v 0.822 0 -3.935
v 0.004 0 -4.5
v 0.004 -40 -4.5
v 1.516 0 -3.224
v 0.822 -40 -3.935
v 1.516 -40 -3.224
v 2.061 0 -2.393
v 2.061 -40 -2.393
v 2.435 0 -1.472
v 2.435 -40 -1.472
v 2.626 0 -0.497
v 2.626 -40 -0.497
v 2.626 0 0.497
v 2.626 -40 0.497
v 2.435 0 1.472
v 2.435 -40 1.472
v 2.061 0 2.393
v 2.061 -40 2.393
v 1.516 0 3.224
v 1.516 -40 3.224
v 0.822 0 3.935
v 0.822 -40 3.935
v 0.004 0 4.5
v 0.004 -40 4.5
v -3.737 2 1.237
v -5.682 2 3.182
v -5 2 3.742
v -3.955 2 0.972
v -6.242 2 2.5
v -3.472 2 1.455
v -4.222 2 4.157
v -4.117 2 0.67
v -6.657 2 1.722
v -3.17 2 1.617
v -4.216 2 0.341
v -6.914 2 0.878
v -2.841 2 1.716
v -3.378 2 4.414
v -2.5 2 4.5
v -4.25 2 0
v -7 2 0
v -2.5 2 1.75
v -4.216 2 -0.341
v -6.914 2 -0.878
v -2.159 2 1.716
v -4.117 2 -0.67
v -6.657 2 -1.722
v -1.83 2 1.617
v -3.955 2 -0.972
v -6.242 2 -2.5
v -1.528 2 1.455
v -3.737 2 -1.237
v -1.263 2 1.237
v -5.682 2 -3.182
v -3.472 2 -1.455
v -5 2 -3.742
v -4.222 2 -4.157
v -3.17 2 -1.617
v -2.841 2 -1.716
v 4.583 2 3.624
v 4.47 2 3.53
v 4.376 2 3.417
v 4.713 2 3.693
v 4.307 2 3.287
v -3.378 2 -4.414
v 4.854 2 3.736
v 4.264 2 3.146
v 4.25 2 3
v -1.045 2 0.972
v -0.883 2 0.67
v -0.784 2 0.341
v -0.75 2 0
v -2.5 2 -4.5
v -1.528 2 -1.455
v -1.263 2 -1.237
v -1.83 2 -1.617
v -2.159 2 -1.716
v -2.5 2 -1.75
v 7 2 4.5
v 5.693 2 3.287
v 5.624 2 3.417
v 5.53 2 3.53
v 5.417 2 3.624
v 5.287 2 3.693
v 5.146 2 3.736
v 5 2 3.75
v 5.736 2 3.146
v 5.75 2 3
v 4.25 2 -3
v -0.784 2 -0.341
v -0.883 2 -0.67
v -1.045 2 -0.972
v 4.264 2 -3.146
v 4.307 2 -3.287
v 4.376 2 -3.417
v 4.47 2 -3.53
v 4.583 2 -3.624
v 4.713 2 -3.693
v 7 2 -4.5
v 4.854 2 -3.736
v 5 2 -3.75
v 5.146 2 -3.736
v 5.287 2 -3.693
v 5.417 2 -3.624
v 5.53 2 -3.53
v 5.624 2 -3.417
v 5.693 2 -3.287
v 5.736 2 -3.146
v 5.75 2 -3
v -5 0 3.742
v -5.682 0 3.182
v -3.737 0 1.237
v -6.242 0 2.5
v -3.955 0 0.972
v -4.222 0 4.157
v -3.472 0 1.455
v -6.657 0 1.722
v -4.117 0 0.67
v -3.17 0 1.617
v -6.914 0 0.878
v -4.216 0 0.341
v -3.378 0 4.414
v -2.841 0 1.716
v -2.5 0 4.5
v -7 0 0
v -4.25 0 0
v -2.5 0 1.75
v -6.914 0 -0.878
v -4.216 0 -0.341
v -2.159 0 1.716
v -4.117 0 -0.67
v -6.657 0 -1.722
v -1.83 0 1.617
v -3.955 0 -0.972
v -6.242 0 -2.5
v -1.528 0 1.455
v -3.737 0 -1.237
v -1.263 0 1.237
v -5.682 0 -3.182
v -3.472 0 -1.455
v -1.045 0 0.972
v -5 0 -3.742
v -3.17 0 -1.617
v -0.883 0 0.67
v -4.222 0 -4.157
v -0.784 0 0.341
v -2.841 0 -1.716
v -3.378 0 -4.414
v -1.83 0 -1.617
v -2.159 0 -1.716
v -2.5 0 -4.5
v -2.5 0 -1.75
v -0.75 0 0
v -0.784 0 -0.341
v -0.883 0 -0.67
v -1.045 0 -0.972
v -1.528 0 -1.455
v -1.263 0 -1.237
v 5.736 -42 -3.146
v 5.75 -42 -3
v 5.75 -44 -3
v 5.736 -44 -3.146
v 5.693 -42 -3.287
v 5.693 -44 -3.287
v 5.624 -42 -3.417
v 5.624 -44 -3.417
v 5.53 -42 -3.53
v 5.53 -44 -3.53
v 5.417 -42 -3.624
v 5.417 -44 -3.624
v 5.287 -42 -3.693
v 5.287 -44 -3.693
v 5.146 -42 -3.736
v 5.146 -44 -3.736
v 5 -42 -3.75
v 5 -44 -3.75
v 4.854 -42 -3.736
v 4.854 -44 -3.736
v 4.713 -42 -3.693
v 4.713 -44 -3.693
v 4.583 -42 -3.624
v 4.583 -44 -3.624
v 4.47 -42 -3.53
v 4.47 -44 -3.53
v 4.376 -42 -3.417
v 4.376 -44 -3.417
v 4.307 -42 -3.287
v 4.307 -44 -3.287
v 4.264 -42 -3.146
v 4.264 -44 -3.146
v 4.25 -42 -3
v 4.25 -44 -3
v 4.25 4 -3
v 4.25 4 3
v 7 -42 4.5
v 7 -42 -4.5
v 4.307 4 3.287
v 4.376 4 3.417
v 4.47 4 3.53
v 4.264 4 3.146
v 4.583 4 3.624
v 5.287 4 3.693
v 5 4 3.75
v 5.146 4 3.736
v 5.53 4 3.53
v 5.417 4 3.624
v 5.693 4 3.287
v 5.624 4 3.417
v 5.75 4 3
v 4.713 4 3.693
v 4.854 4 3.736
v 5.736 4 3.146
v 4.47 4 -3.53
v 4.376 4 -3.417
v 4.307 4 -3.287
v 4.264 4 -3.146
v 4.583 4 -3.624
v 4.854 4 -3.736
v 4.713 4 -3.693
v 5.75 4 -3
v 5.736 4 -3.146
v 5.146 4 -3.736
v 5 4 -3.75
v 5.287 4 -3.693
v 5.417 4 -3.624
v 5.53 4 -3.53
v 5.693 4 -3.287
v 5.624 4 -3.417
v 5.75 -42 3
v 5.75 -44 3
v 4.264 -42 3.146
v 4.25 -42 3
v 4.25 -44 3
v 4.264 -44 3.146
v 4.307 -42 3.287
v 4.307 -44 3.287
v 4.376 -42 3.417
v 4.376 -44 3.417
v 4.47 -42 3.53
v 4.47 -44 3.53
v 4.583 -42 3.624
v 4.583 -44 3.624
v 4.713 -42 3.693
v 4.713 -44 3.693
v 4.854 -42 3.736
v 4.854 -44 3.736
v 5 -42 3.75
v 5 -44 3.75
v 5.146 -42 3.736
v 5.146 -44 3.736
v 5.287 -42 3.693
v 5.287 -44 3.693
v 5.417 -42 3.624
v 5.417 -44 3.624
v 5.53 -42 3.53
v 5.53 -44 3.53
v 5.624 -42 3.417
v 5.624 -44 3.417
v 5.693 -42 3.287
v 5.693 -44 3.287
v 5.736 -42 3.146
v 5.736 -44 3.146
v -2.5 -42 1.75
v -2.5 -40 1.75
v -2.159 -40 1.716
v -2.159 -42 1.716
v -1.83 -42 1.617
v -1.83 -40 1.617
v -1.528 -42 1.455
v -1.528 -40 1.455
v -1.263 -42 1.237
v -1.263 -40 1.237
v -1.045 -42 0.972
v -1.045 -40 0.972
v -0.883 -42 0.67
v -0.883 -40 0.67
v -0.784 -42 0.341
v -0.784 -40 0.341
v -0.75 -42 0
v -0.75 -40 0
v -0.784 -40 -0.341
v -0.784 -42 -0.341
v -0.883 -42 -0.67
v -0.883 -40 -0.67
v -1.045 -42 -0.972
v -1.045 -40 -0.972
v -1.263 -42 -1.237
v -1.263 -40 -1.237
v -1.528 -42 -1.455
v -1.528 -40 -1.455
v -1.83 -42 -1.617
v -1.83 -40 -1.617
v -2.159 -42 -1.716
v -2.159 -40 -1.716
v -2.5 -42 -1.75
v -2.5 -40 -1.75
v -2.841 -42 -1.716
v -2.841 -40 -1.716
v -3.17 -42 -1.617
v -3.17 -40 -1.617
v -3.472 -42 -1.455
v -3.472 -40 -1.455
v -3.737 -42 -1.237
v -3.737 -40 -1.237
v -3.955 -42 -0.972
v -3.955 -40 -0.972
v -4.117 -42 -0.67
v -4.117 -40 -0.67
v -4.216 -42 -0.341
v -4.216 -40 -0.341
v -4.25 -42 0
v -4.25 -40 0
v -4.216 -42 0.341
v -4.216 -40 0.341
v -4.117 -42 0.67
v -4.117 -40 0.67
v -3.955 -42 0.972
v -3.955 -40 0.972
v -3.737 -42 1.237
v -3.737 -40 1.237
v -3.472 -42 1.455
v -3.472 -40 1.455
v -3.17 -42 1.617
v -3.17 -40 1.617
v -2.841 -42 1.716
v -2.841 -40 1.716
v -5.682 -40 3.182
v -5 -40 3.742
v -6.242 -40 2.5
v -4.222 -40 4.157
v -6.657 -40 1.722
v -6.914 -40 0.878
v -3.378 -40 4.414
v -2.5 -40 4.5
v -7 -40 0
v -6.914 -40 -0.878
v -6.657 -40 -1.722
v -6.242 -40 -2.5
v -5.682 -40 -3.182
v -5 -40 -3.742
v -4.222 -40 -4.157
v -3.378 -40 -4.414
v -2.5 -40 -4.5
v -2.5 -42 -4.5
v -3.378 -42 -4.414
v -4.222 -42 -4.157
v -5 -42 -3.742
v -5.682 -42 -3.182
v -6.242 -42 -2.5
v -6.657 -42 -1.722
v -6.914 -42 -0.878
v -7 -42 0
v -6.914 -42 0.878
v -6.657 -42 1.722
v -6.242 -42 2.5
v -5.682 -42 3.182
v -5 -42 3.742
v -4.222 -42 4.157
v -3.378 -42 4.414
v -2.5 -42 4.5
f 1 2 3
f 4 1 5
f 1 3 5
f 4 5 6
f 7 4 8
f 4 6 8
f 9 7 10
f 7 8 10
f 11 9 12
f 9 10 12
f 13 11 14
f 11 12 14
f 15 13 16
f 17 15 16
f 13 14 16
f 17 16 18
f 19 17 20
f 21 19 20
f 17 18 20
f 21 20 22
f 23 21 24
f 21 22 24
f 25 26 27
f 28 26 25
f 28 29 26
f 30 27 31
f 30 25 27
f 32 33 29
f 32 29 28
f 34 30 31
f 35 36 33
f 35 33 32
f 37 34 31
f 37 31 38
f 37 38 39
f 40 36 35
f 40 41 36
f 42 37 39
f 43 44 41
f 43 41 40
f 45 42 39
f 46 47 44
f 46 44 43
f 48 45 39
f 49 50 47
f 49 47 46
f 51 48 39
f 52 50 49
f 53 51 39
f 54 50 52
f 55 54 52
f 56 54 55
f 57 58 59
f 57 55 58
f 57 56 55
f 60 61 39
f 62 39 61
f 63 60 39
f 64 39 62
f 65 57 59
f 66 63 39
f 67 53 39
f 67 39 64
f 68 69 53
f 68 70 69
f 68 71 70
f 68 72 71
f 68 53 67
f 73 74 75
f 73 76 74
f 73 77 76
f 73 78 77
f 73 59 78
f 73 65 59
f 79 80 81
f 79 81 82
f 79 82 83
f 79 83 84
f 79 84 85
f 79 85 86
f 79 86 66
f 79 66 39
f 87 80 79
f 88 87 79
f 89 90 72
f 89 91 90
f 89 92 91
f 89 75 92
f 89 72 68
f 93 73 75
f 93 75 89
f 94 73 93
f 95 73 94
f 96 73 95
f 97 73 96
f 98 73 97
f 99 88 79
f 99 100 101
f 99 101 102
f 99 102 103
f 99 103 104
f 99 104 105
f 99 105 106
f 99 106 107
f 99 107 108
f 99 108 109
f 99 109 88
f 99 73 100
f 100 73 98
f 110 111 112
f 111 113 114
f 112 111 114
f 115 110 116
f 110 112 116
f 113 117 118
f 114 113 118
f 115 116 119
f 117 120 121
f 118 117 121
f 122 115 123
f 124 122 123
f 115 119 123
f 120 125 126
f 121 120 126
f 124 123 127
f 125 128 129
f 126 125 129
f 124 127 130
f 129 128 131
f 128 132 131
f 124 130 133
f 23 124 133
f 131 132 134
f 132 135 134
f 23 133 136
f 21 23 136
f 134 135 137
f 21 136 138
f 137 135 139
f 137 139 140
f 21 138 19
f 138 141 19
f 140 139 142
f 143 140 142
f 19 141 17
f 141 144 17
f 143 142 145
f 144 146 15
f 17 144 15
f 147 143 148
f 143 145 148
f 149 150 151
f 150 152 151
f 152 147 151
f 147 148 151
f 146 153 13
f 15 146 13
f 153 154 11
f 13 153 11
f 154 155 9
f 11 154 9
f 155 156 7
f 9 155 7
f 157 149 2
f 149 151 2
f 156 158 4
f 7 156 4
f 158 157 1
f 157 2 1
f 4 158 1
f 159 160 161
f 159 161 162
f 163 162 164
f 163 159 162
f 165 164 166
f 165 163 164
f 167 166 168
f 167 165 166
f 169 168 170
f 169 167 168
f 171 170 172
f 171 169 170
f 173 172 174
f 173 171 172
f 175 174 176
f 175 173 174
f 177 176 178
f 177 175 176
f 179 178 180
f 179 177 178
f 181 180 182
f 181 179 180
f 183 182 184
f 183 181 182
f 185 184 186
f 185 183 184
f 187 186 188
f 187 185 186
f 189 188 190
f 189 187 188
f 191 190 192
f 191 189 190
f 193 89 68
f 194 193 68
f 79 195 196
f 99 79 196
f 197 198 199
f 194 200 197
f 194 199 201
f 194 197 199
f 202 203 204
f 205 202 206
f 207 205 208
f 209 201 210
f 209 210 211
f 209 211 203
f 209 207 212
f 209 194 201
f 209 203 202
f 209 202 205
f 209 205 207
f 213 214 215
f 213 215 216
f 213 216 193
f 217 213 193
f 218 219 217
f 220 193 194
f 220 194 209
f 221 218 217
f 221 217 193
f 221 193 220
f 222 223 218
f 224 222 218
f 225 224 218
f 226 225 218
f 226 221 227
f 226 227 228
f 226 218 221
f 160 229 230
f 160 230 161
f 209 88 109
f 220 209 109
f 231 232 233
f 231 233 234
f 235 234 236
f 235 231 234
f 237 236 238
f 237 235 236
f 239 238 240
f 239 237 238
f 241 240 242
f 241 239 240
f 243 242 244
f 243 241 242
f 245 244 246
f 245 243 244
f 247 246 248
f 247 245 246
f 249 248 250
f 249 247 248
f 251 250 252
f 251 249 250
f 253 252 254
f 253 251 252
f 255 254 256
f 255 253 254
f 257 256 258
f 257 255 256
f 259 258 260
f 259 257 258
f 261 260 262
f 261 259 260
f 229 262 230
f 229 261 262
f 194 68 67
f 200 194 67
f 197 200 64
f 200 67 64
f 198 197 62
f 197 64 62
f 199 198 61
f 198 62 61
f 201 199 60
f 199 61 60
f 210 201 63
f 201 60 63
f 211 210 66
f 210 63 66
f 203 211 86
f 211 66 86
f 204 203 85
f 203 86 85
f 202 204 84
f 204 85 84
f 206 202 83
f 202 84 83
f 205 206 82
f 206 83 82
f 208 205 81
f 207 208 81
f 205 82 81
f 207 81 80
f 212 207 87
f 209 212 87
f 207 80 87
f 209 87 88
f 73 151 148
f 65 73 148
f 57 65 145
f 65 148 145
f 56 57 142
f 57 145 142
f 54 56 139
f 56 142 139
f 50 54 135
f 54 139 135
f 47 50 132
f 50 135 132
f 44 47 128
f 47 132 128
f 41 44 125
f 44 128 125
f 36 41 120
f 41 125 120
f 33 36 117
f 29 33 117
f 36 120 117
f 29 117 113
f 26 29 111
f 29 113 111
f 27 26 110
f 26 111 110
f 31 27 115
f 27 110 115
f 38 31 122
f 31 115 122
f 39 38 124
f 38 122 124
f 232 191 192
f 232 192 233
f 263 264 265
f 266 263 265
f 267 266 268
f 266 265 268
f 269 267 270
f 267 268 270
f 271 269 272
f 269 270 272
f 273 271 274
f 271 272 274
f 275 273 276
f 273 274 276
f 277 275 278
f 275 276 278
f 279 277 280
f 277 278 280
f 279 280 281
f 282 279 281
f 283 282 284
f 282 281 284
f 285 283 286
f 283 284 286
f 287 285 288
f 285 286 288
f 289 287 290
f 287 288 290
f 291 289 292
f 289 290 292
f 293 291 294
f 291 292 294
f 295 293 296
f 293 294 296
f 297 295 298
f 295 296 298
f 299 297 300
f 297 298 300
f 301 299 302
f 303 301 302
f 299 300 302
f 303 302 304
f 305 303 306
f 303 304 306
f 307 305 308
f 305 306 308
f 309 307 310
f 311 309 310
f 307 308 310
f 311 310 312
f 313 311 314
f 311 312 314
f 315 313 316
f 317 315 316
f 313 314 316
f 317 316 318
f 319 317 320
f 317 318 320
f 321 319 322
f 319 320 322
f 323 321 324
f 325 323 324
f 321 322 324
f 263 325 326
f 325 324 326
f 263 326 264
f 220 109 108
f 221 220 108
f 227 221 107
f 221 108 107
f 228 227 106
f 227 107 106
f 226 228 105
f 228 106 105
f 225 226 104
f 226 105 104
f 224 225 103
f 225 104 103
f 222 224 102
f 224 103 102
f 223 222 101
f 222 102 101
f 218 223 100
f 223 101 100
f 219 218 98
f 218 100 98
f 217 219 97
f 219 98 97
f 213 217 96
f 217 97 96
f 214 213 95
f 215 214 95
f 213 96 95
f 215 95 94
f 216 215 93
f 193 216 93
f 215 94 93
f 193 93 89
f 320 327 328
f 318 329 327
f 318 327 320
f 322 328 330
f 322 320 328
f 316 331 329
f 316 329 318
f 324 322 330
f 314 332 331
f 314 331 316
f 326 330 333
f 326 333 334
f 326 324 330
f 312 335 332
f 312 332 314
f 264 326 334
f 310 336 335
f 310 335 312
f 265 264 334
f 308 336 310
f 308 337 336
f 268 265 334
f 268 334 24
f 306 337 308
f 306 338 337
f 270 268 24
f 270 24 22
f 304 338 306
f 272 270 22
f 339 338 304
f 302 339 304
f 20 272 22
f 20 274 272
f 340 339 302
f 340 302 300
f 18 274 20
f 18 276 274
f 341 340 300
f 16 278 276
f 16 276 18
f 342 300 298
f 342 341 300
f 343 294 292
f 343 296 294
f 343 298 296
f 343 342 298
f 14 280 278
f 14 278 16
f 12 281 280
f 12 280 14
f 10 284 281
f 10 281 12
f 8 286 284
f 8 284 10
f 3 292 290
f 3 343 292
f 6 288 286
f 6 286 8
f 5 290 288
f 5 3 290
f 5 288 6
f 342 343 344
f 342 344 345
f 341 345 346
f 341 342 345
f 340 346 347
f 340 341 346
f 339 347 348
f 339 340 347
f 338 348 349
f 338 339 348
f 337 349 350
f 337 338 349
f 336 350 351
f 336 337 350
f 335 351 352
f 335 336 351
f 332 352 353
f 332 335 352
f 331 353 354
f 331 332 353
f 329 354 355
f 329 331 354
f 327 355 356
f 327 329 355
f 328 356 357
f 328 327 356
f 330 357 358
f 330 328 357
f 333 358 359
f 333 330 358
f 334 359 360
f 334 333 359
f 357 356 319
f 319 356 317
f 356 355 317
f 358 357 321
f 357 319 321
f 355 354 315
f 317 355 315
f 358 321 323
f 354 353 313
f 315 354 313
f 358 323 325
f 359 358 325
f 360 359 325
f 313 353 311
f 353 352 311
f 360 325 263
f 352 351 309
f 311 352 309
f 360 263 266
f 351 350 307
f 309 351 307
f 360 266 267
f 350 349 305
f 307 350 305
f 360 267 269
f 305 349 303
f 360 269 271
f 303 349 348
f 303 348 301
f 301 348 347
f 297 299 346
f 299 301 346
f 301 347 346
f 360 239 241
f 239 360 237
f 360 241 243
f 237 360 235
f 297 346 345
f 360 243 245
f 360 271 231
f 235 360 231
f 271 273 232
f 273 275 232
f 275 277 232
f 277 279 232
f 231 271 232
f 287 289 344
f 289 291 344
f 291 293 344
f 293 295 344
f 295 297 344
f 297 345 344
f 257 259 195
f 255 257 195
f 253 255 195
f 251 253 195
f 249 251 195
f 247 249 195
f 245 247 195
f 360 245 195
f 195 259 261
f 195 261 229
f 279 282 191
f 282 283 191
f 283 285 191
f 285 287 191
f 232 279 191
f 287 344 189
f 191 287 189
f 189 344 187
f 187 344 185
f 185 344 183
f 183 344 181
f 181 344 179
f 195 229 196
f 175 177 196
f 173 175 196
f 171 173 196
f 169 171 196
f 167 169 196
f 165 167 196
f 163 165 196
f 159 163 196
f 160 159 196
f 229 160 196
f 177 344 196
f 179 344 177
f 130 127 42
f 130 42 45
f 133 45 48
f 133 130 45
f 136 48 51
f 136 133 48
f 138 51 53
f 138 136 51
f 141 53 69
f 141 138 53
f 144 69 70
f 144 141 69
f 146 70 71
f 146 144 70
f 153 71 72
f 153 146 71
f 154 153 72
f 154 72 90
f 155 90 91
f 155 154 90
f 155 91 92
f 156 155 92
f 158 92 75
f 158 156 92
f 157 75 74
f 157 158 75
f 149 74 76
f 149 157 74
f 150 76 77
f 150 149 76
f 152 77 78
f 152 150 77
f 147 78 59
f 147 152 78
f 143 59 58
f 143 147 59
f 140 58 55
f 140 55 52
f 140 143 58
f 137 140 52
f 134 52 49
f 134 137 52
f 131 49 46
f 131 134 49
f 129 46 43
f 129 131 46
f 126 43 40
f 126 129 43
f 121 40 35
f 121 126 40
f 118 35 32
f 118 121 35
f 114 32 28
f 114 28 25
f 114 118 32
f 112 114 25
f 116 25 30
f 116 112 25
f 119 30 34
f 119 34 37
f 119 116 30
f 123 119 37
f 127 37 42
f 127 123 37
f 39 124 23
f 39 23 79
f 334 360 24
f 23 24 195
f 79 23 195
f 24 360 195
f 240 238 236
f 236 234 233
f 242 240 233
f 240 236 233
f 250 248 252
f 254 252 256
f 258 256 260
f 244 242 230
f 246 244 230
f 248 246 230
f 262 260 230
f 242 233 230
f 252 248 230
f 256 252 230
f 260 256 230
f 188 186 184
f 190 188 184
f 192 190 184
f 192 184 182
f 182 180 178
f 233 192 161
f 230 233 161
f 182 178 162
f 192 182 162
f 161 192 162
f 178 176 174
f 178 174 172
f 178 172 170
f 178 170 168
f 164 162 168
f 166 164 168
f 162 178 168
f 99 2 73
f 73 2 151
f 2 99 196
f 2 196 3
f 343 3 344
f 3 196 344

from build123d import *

# Parameters (mm, degrees)
SKETCH1_R           = 1.75
BOSS_EXTRUDE3_DEPTH = 2
BOSS_EXTRUDE4_DEPTH = 20
BOSS_EXTRUDE5_DEPTH = 4


with BuildPart() as part:
    # Sketch1 → Boss-Extrude3 (new body)
    with BuildSketch(Plane(origin=(0, 0, 0), x_dir=(1, 0, 0), z_dir=(0, 1, 0))):
        with BuildLine():
            ThreePointArc((-2.5, 4.5), (-7, 0), (-2.5, -4.5))
            Line((-2.5, -4.5), (7, -4.5))
            Line((7, -4.5), (7, 4.5))
            Line((7, 4.5), (-2.5, 4.5))
        make_face()
        with Locations((-2.5, 0)):
            Circle(SKETCH1_R, mode=Mode.SUBTRACT)
    extrude(amount=BOSS_EXTRUDE3_DEPTH)

    # Sketch1<3> → Boss-Extrude4 (add)
    # profile 1 of 2: a face of its own
    with BuildSketch(Plane(origin=(0, 0, 0), x_dir=(1, 0, 0), z_dir=(0, 1, 0))):
        with BuildLine():
            Line((2.508991915, 4.5), (0.004495957, 4.5))
            ThreePointArc((0.004495957, 4.5), (2.65, 0), (0.004495957, -4.5))
            Line((0.004495957, -4.5), (2.508991915, -4.5))
            Line((2.508991915, -4.5), (7, -4.5))
            Line((7, -4.5), (7, 4.5))
            Line((7, 4.5), (2.508991915, 4.5))
        make_face()
        with BuildLine():
            ThreePointArc((4.25, 3), (5, 3.75), (5.75, 3))
            Line((5.75, 3), (5.75, -3))
            ThreePointArc((5.75, -3), (5, -3.75), (4.25, -3))
            Line((4.25, -3), (4.25, 3))
        make_face(mode=Mode.SUBTRACT)
    # profile 2 of 2: a face of its own
    with BuildSketch(Plane(origin=(0, 0, 0), x_dir=(1, 0, 0), z_dir=(0, 1, 0))):
        with BuildLine():
            Line((4.25, 3), (4.25, -3))
            ThreePointArc((4.25, -3), (5, -3.75), (5.75, -3))
            Line((5.75, -3), (5.75, 3))
            ThreePointArc((5.75, 3), (5, 3.75), (4.25, 3))
        make_face()
    extrude(amount=-BOSS_EXTRUDE4_DEPTH)

    # Sketch1<5> → Boss-Extrude5 (add)
    with BuildSketch(Plane(origin=(0, 0, 0), x_dir=(1, 0, 0), z_dir=(0, 1, 0))):
        with BuildLine():
            Line((5.75, -3), (5.75, 3))
            ThreePointArc((5.75, 3), (5, 3.75), (4.25, 3))
            Line((4.25, 3), (4.25, -3))
            ThreePointArc((4.25, -3), (5, -3.75), (5.75, -3))
        make_face()
    extrude(amount=BOSS_EXTRUDE5_DEPTH)

    # Mirror1: part across plane


with BuildPart() as part_1:
    add(part.part)
    add(part.part.mirror(Plane.ZX.offset(-20)))


solid = part_1.part
